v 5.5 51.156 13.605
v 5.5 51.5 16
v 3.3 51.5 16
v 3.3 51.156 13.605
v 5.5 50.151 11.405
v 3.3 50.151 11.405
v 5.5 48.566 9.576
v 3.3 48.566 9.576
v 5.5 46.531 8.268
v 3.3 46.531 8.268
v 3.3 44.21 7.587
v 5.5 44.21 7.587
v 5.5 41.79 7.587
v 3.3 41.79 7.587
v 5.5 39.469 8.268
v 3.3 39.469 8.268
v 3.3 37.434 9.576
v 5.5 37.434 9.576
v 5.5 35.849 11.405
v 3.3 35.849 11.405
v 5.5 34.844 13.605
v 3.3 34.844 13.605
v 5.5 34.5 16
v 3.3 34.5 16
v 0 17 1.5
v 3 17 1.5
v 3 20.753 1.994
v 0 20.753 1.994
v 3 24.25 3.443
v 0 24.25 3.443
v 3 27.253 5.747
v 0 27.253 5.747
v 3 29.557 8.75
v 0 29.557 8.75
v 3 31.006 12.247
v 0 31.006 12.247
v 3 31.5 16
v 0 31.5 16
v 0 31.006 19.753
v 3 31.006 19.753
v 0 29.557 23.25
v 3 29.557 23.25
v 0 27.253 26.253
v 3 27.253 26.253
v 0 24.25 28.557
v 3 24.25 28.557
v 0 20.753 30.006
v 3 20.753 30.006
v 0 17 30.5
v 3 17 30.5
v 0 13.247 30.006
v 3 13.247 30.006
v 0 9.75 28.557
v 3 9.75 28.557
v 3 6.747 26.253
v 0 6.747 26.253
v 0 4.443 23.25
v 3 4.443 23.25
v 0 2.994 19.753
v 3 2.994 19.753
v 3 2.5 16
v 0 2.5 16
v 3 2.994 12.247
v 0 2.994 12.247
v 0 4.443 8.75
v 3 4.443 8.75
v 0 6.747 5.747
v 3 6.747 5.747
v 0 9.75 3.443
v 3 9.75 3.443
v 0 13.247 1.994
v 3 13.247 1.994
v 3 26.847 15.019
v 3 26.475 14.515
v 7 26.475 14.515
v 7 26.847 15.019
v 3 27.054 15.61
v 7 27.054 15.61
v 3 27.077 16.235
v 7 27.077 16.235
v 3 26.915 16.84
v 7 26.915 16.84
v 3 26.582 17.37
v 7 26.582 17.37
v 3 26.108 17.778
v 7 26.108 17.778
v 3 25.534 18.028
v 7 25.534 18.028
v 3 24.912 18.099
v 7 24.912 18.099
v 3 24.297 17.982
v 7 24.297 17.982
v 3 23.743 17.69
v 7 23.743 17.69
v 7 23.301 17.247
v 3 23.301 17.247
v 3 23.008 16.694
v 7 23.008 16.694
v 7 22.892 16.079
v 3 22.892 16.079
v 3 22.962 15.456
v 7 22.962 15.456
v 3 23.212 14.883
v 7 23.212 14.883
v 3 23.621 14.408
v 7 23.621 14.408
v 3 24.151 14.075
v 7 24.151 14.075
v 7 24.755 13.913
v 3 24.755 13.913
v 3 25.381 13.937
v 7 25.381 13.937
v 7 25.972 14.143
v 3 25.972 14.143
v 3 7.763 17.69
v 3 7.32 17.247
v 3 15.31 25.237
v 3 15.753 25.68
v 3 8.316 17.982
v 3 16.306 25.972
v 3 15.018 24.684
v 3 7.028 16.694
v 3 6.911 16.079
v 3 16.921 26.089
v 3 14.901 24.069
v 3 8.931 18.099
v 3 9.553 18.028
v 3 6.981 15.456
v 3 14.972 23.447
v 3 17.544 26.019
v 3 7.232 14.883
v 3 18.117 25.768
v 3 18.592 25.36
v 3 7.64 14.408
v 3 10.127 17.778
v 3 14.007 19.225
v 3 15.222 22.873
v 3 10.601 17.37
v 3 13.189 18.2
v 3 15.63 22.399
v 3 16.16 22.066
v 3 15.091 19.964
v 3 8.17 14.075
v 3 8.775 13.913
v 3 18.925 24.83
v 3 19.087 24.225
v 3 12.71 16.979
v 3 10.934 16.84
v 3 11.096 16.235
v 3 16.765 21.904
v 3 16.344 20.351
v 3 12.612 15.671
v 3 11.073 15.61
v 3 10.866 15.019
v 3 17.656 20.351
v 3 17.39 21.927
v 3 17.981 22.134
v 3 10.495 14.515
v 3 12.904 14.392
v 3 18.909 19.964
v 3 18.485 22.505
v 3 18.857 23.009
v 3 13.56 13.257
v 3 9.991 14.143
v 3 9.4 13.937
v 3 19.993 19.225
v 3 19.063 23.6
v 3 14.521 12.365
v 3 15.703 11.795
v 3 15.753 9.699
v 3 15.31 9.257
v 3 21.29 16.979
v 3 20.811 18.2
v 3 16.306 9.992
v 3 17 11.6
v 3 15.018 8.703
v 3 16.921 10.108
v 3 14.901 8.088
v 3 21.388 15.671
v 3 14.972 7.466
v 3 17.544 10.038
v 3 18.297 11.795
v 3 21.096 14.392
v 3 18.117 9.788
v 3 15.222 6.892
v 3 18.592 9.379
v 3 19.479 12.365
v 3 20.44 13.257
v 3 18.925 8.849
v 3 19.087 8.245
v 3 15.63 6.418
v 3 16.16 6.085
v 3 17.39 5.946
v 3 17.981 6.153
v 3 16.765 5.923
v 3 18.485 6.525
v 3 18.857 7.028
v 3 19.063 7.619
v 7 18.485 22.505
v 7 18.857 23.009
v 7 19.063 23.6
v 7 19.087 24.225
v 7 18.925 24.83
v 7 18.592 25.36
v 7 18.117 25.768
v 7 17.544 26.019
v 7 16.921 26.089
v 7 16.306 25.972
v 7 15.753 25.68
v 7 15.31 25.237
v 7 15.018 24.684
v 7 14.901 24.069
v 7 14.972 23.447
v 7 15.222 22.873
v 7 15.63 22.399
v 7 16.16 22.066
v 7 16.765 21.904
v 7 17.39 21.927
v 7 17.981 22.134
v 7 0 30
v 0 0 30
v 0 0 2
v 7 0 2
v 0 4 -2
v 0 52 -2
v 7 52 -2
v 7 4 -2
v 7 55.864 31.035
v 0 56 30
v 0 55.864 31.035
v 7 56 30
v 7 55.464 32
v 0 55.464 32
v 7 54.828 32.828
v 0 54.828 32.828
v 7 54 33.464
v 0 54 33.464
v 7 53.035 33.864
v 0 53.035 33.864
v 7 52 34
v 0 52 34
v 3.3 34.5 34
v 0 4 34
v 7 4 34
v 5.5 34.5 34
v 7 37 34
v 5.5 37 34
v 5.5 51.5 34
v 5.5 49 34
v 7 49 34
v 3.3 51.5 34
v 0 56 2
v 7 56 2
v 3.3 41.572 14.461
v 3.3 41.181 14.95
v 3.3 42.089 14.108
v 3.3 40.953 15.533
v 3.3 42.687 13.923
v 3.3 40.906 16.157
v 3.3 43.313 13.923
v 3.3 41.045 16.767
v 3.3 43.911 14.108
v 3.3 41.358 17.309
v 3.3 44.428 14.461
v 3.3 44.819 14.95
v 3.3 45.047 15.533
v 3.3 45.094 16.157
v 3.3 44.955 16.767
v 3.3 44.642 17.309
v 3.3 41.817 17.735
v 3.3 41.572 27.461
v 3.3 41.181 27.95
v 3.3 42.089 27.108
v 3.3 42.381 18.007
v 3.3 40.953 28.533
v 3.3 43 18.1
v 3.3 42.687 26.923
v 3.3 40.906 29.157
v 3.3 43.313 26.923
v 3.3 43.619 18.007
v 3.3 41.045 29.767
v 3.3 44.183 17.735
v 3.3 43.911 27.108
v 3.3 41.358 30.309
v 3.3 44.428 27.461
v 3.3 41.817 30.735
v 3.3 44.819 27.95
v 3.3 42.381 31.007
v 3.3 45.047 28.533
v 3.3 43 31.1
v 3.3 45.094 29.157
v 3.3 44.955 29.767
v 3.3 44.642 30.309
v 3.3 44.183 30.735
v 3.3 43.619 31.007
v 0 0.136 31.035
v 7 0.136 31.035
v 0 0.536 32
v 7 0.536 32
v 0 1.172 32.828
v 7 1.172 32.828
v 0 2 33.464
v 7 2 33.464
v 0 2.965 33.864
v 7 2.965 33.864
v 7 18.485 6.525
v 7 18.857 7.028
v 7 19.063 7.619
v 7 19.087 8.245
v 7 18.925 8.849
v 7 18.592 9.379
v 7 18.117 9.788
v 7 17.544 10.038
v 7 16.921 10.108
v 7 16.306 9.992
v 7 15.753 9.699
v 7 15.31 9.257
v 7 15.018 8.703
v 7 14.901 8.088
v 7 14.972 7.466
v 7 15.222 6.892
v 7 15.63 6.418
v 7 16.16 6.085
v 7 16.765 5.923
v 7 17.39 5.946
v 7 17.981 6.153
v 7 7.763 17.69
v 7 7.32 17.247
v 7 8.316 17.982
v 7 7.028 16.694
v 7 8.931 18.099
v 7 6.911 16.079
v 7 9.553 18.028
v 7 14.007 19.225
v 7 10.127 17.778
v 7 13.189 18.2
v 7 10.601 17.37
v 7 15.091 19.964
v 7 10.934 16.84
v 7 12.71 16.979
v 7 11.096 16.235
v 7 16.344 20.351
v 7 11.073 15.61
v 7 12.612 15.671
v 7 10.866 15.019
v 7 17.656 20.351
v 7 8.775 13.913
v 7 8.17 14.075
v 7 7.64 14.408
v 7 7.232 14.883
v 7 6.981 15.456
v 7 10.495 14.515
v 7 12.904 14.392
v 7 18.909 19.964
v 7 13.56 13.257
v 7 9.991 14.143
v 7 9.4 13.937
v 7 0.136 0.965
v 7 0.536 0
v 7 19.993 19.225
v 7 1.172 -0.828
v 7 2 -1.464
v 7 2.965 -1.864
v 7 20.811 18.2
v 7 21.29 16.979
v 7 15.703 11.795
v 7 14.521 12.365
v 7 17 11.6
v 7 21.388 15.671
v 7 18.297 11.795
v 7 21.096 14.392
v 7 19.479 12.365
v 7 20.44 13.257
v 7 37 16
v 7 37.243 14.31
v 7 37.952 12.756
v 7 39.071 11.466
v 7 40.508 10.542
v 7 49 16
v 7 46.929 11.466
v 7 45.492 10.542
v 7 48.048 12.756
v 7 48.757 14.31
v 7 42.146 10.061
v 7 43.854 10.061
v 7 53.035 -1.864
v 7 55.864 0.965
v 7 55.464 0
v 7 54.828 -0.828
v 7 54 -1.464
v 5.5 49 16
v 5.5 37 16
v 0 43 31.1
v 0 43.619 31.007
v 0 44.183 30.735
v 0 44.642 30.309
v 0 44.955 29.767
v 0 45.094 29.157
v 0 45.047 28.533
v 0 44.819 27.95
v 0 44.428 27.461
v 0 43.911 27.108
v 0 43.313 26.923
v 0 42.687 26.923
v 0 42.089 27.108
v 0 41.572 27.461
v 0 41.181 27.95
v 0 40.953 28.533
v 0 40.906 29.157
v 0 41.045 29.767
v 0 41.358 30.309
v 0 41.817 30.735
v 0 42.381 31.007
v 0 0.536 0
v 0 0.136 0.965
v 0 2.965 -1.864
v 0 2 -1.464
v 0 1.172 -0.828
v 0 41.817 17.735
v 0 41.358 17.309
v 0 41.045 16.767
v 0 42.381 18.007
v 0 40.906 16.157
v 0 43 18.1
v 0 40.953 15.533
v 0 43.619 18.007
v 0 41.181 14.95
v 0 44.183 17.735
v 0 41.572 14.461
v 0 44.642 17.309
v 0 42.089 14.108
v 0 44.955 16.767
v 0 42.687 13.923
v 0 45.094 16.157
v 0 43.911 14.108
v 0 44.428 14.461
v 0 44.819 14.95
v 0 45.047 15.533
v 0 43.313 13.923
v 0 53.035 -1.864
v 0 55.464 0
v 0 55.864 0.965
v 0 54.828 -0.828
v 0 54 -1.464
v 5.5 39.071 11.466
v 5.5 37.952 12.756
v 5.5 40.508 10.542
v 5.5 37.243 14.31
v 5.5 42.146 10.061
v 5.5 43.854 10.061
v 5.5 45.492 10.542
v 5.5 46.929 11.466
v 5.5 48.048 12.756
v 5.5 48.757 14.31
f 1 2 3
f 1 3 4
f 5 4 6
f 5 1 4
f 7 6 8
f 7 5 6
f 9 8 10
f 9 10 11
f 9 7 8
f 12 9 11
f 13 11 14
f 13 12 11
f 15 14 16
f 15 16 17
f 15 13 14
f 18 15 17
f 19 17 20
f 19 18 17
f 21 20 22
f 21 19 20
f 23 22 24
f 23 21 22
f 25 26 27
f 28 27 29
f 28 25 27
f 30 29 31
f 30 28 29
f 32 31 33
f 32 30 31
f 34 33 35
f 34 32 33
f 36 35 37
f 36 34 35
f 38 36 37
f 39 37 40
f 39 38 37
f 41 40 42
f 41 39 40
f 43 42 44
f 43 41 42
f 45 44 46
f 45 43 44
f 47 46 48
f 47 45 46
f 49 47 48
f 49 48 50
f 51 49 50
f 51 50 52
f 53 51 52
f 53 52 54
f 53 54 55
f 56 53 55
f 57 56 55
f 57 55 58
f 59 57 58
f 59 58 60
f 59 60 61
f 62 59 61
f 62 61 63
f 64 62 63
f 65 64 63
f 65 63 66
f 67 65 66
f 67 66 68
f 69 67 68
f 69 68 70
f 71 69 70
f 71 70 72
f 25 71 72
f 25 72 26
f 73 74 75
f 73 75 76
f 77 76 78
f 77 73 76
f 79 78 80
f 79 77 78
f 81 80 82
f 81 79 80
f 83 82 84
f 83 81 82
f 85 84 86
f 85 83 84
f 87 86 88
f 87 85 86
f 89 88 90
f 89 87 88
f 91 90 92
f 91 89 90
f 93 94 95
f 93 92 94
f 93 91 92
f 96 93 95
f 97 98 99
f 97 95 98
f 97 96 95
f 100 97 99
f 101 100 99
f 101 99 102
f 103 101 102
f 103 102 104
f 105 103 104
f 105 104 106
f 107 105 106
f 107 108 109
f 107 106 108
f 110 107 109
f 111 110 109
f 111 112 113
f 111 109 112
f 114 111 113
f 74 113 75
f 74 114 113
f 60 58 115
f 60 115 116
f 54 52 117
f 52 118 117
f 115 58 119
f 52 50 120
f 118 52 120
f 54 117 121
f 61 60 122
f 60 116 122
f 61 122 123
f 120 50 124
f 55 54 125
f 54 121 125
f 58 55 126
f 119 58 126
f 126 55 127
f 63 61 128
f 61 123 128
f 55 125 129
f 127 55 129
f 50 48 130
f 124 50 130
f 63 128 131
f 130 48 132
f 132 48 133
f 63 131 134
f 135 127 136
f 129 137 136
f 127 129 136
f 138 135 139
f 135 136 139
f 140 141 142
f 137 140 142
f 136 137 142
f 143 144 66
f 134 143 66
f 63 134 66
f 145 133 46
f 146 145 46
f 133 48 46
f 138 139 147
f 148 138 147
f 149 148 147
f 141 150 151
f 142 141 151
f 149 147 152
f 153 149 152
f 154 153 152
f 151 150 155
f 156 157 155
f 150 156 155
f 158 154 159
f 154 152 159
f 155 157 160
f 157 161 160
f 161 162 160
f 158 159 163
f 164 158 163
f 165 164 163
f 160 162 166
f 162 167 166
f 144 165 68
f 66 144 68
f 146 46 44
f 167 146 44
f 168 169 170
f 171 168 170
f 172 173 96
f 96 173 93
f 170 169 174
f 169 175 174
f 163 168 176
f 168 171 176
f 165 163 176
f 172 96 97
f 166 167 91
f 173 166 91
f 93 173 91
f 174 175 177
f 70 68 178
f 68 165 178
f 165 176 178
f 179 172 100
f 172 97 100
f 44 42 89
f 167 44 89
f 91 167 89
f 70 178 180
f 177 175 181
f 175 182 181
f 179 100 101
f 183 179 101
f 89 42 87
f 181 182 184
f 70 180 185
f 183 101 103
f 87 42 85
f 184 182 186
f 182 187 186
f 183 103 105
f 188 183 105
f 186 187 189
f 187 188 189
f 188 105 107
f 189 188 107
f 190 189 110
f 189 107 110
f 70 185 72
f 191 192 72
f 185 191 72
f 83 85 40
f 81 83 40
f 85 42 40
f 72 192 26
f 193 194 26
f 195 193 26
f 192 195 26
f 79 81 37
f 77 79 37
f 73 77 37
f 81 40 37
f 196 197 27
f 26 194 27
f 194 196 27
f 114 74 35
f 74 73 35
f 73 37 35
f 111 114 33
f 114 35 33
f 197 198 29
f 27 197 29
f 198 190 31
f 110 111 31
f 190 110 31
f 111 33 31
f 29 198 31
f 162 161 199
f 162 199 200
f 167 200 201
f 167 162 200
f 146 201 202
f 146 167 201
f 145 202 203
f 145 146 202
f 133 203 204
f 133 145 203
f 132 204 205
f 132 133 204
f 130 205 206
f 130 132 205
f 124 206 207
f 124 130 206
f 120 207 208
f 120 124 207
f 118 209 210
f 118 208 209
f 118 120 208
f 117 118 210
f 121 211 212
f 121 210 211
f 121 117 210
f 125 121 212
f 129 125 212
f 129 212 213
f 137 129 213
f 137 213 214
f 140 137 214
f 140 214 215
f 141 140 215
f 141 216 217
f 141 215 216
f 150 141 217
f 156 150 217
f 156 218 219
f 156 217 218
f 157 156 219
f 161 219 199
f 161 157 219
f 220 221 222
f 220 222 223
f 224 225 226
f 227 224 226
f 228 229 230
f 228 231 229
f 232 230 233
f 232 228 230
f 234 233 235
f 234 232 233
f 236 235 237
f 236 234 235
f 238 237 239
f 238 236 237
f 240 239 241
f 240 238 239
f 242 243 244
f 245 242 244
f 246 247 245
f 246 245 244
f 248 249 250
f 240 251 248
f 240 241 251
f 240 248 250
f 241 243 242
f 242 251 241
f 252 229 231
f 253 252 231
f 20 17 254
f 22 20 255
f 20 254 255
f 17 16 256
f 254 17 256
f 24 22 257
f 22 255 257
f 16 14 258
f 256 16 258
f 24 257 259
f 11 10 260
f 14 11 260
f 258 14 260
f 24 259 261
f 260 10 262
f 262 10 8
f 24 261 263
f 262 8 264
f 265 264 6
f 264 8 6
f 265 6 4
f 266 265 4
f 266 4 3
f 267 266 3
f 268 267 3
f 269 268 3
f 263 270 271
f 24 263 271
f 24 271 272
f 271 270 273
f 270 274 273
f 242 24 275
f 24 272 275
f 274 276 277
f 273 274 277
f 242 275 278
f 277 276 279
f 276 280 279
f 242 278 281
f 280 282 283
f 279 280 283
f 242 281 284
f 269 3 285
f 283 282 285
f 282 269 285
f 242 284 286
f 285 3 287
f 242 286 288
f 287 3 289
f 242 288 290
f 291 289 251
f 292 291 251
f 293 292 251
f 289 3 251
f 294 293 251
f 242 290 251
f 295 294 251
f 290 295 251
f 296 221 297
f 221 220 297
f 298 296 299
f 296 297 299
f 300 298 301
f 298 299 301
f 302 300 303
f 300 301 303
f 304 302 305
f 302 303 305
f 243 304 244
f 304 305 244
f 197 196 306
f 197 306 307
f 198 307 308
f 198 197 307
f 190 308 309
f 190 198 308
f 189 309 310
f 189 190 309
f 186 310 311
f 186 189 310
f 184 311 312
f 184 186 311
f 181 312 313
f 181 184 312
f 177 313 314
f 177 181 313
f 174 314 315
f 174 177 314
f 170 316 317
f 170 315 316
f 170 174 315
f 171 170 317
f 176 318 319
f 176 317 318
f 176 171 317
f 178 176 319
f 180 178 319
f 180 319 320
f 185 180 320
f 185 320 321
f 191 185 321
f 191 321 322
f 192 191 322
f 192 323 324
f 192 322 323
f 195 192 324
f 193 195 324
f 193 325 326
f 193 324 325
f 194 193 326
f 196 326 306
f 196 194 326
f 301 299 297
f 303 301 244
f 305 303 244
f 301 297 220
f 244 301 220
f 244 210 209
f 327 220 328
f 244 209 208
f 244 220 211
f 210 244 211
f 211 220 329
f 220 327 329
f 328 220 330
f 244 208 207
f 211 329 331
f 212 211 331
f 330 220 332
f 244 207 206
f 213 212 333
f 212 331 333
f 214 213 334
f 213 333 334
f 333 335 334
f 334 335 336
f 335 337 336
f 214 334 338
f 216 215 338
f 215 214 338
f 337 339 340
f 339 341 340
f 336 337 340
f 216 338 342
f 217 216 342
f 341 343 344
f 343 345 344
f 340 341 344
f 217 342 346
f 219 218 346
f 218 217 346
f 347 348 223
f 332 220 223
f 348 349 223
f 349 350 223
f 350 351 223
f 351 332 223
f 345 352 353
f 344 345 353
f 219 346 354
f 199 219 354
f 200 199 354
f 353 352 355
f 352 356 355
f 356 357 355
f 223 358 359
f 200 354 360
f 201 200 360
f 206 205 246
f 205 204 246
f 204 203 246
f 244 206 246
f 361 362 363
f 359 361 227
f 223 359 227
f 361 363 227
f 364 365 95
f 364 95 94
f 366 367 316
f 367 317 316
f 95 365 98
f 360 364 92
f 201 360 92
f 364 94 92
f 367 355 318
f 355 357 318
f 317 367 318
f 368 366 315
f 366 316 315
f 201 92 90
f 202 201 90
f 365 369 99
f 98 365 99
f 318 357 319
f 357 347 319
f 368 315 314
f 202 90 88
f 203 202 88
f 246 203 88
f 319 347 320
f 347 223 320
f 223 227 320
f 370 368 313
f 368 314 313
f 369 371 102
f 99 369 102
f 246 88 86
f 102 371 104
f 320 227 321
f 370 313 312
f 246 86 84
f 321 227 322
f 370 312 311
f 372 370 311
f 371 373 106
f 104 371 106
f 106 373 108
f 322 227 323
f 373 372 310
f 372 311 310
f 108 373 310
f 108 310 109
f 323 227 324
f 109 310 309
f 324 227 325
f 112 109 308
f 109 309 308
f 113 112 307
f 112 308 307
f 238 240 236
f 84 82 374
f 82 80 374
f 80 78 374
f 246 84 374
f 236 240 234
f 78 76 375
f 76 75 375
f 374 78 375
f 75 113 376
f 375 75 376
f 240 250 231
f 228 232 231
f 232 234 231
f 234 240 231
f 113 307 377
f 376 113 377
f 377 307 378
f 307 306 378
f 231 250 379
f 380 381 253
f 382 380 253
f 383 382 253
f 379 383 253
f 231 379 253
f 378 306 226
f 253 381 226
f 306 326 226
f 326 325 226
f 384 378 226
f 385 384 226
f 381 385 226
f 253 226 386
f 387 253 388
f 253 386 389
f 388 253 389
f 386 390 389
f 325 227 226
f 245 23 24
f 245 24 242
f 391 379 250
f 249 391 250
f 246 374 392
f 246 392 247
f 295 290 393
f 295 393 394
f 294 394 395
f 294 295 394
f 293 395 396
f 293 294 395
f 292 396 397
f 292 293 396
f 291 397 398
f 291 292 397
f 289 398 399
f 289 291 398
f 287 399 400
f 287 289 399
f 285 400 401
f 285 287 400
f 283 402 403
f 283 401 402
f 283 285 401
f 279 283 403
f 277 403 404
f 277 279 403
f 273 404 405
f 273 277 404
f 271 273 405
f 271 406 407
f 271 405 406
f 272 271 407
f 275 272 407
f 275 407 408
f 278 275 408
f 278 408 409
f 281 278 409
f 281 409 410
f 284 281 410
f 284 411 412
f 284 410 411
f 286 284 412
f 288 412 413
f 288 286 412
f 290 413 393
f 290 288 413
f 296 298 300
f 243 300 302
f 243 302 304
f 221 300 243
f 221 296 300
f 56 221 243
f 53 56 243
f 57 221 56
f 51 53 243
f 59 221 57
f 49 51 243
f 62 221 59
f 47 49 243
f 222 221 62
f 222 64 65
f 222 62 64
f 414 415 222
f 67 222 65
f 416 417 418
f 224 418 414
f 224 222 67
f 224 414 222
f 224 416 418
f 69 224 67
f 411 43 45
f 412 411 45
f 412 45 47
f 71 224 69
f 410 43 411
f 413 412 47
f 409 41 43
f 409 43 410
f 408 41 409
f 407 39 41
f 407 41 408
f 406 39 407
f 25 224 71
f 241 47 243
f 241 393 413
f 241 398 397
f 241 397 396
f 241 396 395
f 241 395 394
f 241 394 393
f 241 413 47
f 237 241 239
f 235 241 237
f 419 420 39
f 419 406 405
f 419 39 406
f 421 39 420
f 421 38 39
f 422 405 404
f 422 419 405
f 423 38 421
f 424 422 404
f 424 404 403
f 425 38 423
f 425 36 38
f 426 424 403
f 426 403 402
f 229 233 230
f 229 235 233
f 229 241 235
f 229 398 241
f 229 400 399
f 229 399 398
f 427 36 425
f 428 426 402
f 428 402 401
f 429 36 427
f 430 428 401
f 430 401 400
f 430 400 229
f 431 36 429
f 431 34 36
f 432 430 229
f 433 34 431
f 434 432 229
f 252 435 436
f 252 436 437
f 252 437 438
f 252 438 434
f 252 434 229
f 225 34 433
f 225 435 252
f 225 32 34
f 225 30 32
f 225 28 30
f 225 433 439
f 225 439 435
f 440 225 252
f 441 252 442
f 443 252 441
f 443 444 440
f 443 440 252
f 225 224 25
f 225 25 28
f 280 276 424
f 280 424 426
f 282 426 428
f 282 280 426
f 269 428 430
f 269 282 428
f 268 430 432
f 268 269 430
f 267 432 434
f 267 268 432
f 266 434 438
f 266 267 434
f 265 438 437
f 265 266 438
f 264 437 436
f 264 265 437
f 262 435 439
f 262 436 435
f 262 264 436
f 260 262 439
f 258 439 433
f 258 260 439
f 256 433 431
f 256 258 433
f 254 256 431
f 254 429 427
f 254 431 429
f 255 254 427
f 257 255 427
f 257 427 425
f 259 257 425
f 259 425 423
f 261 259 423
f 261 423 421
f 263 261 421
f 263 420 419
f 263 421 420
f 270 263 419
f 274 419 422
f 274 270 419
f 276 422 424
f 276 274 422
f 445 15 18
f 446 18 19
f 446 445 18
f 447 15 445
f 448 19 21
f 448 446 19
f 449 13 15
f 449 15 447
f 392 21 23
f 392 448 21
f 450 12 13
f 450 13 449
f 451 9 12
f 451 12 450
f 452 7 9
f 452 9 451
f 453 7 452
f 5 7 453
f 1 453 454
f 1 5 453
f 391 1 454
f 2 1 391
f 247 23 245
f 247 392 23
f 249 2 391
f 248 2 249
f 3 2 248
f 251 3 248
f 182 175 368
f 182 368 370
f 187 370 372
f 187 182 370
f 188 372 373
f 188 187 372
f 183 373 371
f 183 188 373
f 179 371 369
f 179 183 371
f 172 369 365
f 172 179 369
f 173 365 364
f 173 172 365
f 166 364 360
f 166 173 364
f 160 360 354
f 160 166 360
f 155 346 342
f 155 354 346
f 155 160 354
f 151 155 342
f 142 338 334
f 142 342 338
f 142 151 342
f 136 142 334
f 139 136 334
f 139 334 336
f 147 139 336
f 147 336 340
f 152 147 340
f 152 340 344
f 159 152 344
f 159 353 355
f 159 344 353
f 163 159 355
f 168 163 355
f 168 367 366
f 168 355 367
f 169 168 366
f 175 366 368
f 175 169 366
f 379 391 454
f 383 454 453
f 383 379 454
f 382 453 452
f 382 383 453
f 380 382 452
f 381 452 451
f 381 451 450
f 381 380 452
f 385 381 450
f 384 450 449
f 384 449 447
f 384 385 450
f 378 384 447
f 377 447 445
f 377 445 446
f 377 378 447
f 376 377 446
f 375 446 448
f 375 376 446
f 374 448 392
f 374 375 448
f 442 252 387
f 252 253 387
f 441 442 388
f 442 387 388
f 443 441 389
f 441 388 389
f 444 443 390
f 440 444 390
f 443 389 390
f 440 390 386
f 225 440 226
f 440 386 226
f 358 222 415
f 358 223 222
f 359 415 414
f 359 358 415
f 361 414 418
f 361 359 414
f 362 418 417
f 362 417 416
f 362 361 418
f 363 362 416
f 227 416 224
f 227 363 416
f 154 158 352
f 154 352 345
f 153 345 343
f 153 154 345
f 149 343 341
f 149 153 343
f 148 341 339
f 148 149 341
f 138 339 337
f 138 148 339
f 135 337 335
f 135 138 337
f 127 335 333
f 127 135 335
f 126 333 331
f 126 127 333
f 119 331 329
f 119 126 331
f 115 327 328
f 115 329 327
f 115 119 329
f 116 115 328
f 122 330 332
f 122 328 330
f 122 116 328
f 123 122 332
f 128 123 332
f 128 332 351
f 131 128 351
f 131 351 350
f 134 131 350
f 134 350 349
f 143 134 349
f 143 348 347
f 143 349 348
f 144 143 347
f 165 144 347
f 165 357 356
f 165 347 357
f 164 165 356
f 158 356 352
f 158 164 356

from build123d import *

# Parameters (mm, degrees)
CYLINDER018_R               = 14.5
CYLINDER018_DEPTH           = 20
CYLINDER114_R               = 2.1
CYLINDER114_DEPTH           = 30
ARRAY001010_X_COUNT         = 2
ARRAY001010_X_PITCH         = 11.3
ARRAY001010_Y_COUNT         = 2
ARRAY001010_Y_PITCH         = 11.3
COMPOUND005_PLACEMENT_ANGLE = 45
CYLINDER012_R               = 4.4
CYLINDER012_DEPTH           = 40
FUSION004_PLACEMENT_ANGLE   = 90
CYLINDER111_R               = 6
CYLINDER111_DEPTH           = 60
BOX011_W                    = 50
BOX011_H                    = 17
BOX011_DEPTH                = 2.2
BOX012_W                    = 50
BOX012_H                    = 12
BOX012_DEPTH                = 60
CYLINDER113_R               = 2.1
CYLINDER113_DEPTH           = 20
ARRAY001019_X_COUNT         = 2
ARRAY001019_X_PITCH         = 13
CYLINDER112_R               = 8.5
CYLINDER112_DEPTH           = 2.2
FUSION013_PLACEMENT_ANGLE   = 90
BOX010_W                    = 7
BOX010_H                    = 56
BOX010_DEPTH                = 36
FILLET005_R                 = 4


with BuildPart() as backlash_nut_disk_hole:
    # Cylinder018 → Cylinder018 (new body)
    with BuildSketch(Plane.XY.offset(-23)):
        Circle(CYLINDER018_R)
    extrude(amount=CYLINDER018_DEPTH)


with BuildPart() as backlash_insert_holes_compound:
    # Cylinder114 → Cylinder114 (new body)
    with BuildSketch(Plane.XY.offset(-20)):
        Circle(CYLINDER114_R)
    extrude(amount=CYLINDER114_DEPTH)

    # Array001010 X: backlash insert holes compound ×2


with BuildPart() as backlash_insert_holes_compound_1:
    add(backlash_insert_holes_compound.part)
    with Locations(*[(i * ARRAY001010_X_PITCH, 0, 0) for i in range(1, ARRAY001010_X_COUNT)]):
        add(backlash_insert_holes_compound.part)

    # Array001010 Y: backlash insert holes compound ×2


with BuildPart() as backlash_insert_holes_compound_2:
    add(backlash_insert_holes_compound_1.part)
    with Locations(*[(0, i * ARRAY001010_Y_PITCH, 0) for i in range(1, ARRAY001010_Y_COUNT)]):
        add(backlash_insert_holes_compound_1.part)


with BuildPart() as backlash_insert_holes_compound_3:
    # Array001010 placement: moved
    add(backlash_insert_holes_compound_2.part.moved(Location((-5.65, -5.65, 0))))


with BuildPart() as backlash_insert_holes_compound_4:
    # Compound005 placement: moved
    add(backlash_insert_holes_compound_3.part.rotate(Axis((0, 0, 0), (0, 0, 1)), COMPOUND005_PLACEMENT_ANGLE))


with BuildPart() as nut_disk_hole_union:
    # Cylinder012 → Cylinder012 (new body)
    with BuildSketch(Plane.XY.offset(-20)):
        Circle(CYLINDER012_R)
    extrude(amount=CYLINDER012_DEPTH)

    # Fusion004: union backlash nut disk hole, backlash insert holes compound
    add(backlash_nut_disk_hole.part)
    add(backlash_insert_holes_compound_4.part)


with BuildPart() as nut_disk_hole_union_1:
    # Fusion004 placement: moved
    add(nut_disk_hole_union.part.moved(Location((6, 17, 16))).rotate(Axis((6, 17, 16), (0, 1, 0)), FUSION004_PLACEMENT_ANGLE))


with BuildPart() as syringe_pusher_body_extract:
    # Cylinder111 → Cylinder111 (new body)
    with BuildSketch(Plane.XY):
        Circle(CYLINDER111_R)
    extrude(amount=CYLINDER111_DEPTH)


with BuildPart() as syringe_pusher_disk_path_extract:
    # Box011 → Box011 (new body)
    with BuildSketch(Plane(origin=(0, -8.5, 60), x_dir=(1, 0, 0), z_dir=(0, 0, 1))):
        with Locations((25, 8.5)):
            Rectangle(BOX011_W, BOX011_H)
    extrude(amount=BOX011_DEPTH)


with BuildPart() as syringe_pusher_body_path_extract:
    # Box012 → Box012 (new body)
    with BuildSketch(Plane(origin=(0, -6, 0), x_dir=(1, 0, 0), z_dir=(0, 0, 1))):
        with Locations((25, 6)):
            Rectangle(BOX012_W, BOX012_H)
    extrude(amount=BOX012_DEPTH)


with BuildPart() as syringe_pusher_insert_hole_extract_array:
    # Cylinder113 → Cylinder113 (new body)
    with BuildSketch(Plane.XY.offset(60)):
        Circle(CYLINDER113_R)
    extrude(amount=CYLINDER113_DEPTH)

    # Array001019 X: syringe pusher insert hole extract array ×2


with BuildPart() as syringe_pusher_insert_hole_extract_array_1:
    add(syringe_pusher_insert_hole_extract_array.part)
    with Locations(*[(i * ARRAY001019_X_PITCH, 0, 0) for i in range(1, ARRAY001019_X_COUNT)]):
        add(syringe_pusher_insert_hole_extract_array.part)


with BuildPart() as middle_block_extract_fusion:
    # Cylinder112 → Cylinder112 (new body)
    with BuildSketch(Plane.XY.offset(60)):
        Circle(CYLINDER112_R)
    extrude(amount=CYLINDER112_DEPTH)

    # Fusion013: union syringe pusher body extract, syringe pusher disk path extract, syringe pusher body path extract, syringe pusher insert hole extract array
    add(syringe_pusher_body_extract.part)
    add(syringe_pusher_disk_path_extract.part)
    add(syringe_pusher_body_path_extract.part)
    add(syringe_pusher_insert_hole_extract_array_1.part)


with BuildPart() as middle_block_extract_fusion_1:
    # Fusion013 placement: moved
    add(middle_block_extract_fusion.part.moved(Location((65.5, 43, 16))).rotate(Axis((65.5, 43, 16), (0, -1, 0)), FUSION013_PLACEMENT_ANGLE))

    # Fusion014: union nut disk hole union
    add(nut_disk_hole_union_1.part)


with BuildPart() as middle_block_cut:
    # Box010 → Box010 (new body)
    with BuildSketch(Plane.XY.offset(-2)):
        with Locations((3.5, 28)):
            Rectangle(BOX010_W, BOX010_H)
    extrude(amount=BOX010_DEPTH)

    # Fillet005
    fillet005_edges = [middle_block_cut.edges().sort_by_distance(p)[0] for p in [
        (3.5, 0, -2),
        (3.5, 0, 34),
        (3.5, 56, -2),
        (3.5, 56, 34),
    ]]
    fillet(fillet005_edges, radius=FILLET005_R)

    # Cut009: cut middle block extract fusion
    add(middle_block_extract_fusion_1.part, mode=Mode.SUBTRACT)


solid = middle_block_cut.part
